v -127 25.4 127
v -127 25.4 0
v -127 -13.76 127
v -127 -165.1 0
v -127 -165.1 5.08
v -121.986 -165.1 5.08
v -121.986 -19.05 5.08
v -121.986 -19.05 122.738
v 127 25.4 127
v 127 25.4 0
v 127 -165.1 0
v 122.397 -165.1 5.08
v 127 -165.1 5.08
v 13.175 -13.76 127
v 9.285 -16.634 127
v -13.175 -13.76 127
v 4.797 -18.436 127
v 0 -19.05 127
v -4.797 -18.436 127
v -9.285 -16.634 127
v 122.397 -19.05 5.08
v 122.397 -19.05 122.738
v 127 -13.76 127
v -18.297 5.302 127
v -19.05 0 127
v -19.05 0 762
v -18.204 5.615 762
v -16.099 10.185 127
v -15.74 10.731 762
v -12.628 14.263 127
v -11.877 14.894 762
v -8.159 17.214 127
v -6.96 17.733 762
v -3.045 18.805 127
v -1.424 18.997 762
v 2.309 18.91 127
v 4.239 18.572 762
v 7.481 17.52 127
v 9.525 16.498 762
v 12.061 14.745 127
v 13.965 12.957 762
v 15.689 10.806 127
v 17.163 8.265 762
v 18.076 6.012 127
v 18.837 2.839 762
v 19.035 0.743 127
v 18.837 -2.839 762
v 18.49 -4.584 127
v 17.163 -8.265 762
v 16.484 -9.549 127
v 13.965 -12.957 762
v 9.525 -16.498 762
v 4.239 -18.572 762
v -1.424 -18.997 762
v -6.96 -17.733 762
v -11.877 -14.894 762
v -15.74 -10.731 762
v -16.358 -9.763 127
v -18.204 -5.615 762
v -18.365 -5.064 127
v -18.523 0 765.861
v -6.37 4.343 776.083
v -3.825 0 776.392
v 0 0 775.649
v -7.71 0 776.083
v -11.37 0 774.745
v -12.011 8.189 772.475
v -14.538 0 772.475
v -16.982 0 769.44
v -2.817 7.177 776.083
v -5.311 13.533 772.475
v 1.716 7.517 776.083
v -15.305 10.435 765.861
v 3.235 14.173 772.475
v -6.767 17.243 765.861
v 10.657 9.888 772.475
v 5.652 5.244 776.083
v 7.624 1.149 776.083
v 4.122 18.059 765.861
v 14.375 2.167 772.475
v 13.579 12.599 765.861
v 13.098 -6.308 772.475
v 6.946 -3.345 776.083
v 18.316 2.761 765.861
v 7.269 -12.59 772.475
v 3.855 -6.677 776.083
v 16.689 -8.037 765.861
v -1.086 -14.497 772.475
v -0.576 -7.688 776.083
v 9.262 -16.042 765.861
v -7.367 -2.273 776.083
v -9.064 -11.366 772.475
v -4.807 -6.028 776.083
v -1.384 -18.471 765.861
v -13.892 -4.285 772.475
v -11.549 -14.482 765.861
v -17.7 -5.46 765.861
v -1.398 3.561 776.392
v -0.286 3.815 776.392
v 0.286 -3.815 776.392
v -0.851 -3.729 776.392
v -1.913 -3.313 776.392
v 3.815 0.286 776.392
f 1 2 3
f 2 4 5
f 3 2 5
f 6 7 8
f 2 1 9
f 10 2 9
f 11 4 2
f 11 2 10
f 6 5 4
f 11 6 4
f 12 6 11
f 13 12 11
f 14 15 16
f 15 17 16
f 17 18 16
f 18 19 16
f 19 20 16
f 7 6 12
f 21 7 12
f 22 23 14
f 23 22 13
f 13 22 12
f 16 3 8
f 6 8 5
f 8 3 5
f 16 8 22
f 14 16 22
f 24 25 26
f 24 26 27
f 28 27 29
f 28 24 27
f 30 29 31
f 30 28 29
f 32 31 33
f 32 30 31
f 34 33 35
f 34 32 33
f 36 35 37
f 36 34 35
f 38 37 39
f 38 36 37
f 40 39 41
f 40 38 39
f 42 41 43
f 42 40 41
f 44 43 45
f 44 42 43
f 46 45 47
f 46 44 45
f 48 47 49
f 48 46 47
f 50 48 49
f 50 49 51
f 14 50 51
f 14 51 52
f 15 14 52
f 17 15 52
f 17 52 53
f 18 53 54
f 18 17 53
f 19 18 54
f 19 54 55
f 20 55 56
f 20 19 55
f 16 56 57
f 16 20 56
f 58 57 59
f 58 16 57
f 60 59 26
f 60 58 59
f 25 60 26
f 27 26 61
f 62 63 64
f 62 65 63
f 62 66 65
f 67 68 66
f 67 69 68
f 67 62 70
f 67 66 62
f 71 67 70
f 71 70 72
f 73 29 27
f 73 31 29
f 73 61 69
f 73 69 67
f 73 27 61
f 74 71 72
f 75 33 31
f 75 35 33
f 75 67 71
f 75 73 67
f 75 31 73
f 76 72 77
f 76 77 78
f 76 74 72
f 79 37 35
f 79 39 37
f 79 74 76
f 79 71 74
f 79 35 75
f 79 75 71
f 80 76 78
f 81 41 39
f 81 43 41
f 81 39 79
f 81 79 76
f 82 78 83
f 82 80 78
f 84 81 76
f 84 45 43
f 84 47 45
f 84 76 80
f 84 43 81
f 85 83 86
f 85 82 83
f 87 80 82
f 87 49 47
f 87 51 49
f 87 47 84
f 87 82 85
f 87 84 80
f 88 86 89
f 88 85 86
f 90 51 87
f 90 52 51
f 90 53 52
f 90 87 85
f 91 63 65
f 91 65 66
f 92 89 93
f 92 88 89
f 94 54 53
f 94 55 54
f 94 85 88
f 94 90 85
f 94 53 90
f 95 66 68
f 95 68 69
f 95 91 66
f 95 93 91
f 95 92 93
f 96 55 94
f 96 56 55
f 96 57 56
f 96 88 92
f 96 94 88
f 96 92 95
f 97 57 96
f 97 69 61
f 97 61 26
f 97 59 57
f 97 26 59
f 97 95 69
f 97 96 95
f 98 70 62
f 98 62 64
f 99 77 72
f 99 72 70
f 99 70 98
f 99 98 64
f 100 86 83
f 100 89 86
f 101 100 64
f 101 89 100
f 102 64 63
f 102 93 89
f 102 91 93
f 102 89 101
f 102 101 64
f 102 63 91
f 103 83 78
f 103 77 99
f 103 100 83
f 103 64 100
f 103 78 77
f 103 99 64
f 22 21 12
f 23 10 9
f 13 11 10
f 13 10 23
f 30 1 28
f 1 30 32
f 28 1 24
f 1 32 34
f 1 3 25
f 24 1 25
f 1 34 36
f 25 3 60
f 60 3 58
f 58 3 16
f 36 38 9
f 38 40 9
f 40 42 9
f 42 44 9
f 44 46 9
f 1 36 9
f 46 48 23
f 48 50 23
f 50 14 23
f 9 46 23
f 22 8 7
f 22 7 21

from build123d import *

# Parameters (mm, degrees)
F2_W          = 254
F2_H          = 127
F3_DEPTH      = 165.1
F3_DEPTH_BACK = 25.4
F5_DEPTH      = 386.08
F6_W          = 244.38259
F6_H          = 119.596362
F7_DEPTH      = 146.05


with BuildPart() as f1:
    # F0 (on Front) → F1 (revolve)
    with BuildSketch(Plane.XZ):
        with BuildLine():
            Line((-19.05, 762), (-19.05, 0))
            Line((-19.05, 0), (0, 0))
            Line((0, 0), (0, 762))
            Line((0, 762), (0, 775.64925))
            ThreePointArc((0, 775.64925), (-13.030766, 773.717556), (-19.05, 762))
        make_face()
    revolve(axis=Axis((0, 0, 381), (0, 0, -1)))

    # F2 (on Front) → F3 (join, two sides)
    with BuildSketch(Plane.XZ) as f3_sk:
        with Locations((0, 63.5)):
            Rectangle(F2_W, F2_H)
    extrude(amount=F3_DEPTH)
    extrude(f3_sk.sketch, amount=-F3_DEPTH_BACK)

    # F4 (on face) → F5 (cut)
    with BuildSketch(Plane(origin=(-127, 0, 0), x_dir=(0, -1, 0), z_dir=(-1, 0, 0))):
        Polygon((165.1, 127), (13.759854, 127), (165.1, 5.08), align=None)
    extrude(amount=-F5_DEPTH, mode=Mode.SUBTRACT)

    # F6 (on face) → F7 (cut)
    with BuildSketch(Plane.XZ.offset(165.1)):
        with Locations((0.205591, 64.878181)):
            Rectangle(F6_W, F6_H)
    extrude(amount=-F7_DEPTH, mode=Mode.SUBTRACT)


solid = f1.part
